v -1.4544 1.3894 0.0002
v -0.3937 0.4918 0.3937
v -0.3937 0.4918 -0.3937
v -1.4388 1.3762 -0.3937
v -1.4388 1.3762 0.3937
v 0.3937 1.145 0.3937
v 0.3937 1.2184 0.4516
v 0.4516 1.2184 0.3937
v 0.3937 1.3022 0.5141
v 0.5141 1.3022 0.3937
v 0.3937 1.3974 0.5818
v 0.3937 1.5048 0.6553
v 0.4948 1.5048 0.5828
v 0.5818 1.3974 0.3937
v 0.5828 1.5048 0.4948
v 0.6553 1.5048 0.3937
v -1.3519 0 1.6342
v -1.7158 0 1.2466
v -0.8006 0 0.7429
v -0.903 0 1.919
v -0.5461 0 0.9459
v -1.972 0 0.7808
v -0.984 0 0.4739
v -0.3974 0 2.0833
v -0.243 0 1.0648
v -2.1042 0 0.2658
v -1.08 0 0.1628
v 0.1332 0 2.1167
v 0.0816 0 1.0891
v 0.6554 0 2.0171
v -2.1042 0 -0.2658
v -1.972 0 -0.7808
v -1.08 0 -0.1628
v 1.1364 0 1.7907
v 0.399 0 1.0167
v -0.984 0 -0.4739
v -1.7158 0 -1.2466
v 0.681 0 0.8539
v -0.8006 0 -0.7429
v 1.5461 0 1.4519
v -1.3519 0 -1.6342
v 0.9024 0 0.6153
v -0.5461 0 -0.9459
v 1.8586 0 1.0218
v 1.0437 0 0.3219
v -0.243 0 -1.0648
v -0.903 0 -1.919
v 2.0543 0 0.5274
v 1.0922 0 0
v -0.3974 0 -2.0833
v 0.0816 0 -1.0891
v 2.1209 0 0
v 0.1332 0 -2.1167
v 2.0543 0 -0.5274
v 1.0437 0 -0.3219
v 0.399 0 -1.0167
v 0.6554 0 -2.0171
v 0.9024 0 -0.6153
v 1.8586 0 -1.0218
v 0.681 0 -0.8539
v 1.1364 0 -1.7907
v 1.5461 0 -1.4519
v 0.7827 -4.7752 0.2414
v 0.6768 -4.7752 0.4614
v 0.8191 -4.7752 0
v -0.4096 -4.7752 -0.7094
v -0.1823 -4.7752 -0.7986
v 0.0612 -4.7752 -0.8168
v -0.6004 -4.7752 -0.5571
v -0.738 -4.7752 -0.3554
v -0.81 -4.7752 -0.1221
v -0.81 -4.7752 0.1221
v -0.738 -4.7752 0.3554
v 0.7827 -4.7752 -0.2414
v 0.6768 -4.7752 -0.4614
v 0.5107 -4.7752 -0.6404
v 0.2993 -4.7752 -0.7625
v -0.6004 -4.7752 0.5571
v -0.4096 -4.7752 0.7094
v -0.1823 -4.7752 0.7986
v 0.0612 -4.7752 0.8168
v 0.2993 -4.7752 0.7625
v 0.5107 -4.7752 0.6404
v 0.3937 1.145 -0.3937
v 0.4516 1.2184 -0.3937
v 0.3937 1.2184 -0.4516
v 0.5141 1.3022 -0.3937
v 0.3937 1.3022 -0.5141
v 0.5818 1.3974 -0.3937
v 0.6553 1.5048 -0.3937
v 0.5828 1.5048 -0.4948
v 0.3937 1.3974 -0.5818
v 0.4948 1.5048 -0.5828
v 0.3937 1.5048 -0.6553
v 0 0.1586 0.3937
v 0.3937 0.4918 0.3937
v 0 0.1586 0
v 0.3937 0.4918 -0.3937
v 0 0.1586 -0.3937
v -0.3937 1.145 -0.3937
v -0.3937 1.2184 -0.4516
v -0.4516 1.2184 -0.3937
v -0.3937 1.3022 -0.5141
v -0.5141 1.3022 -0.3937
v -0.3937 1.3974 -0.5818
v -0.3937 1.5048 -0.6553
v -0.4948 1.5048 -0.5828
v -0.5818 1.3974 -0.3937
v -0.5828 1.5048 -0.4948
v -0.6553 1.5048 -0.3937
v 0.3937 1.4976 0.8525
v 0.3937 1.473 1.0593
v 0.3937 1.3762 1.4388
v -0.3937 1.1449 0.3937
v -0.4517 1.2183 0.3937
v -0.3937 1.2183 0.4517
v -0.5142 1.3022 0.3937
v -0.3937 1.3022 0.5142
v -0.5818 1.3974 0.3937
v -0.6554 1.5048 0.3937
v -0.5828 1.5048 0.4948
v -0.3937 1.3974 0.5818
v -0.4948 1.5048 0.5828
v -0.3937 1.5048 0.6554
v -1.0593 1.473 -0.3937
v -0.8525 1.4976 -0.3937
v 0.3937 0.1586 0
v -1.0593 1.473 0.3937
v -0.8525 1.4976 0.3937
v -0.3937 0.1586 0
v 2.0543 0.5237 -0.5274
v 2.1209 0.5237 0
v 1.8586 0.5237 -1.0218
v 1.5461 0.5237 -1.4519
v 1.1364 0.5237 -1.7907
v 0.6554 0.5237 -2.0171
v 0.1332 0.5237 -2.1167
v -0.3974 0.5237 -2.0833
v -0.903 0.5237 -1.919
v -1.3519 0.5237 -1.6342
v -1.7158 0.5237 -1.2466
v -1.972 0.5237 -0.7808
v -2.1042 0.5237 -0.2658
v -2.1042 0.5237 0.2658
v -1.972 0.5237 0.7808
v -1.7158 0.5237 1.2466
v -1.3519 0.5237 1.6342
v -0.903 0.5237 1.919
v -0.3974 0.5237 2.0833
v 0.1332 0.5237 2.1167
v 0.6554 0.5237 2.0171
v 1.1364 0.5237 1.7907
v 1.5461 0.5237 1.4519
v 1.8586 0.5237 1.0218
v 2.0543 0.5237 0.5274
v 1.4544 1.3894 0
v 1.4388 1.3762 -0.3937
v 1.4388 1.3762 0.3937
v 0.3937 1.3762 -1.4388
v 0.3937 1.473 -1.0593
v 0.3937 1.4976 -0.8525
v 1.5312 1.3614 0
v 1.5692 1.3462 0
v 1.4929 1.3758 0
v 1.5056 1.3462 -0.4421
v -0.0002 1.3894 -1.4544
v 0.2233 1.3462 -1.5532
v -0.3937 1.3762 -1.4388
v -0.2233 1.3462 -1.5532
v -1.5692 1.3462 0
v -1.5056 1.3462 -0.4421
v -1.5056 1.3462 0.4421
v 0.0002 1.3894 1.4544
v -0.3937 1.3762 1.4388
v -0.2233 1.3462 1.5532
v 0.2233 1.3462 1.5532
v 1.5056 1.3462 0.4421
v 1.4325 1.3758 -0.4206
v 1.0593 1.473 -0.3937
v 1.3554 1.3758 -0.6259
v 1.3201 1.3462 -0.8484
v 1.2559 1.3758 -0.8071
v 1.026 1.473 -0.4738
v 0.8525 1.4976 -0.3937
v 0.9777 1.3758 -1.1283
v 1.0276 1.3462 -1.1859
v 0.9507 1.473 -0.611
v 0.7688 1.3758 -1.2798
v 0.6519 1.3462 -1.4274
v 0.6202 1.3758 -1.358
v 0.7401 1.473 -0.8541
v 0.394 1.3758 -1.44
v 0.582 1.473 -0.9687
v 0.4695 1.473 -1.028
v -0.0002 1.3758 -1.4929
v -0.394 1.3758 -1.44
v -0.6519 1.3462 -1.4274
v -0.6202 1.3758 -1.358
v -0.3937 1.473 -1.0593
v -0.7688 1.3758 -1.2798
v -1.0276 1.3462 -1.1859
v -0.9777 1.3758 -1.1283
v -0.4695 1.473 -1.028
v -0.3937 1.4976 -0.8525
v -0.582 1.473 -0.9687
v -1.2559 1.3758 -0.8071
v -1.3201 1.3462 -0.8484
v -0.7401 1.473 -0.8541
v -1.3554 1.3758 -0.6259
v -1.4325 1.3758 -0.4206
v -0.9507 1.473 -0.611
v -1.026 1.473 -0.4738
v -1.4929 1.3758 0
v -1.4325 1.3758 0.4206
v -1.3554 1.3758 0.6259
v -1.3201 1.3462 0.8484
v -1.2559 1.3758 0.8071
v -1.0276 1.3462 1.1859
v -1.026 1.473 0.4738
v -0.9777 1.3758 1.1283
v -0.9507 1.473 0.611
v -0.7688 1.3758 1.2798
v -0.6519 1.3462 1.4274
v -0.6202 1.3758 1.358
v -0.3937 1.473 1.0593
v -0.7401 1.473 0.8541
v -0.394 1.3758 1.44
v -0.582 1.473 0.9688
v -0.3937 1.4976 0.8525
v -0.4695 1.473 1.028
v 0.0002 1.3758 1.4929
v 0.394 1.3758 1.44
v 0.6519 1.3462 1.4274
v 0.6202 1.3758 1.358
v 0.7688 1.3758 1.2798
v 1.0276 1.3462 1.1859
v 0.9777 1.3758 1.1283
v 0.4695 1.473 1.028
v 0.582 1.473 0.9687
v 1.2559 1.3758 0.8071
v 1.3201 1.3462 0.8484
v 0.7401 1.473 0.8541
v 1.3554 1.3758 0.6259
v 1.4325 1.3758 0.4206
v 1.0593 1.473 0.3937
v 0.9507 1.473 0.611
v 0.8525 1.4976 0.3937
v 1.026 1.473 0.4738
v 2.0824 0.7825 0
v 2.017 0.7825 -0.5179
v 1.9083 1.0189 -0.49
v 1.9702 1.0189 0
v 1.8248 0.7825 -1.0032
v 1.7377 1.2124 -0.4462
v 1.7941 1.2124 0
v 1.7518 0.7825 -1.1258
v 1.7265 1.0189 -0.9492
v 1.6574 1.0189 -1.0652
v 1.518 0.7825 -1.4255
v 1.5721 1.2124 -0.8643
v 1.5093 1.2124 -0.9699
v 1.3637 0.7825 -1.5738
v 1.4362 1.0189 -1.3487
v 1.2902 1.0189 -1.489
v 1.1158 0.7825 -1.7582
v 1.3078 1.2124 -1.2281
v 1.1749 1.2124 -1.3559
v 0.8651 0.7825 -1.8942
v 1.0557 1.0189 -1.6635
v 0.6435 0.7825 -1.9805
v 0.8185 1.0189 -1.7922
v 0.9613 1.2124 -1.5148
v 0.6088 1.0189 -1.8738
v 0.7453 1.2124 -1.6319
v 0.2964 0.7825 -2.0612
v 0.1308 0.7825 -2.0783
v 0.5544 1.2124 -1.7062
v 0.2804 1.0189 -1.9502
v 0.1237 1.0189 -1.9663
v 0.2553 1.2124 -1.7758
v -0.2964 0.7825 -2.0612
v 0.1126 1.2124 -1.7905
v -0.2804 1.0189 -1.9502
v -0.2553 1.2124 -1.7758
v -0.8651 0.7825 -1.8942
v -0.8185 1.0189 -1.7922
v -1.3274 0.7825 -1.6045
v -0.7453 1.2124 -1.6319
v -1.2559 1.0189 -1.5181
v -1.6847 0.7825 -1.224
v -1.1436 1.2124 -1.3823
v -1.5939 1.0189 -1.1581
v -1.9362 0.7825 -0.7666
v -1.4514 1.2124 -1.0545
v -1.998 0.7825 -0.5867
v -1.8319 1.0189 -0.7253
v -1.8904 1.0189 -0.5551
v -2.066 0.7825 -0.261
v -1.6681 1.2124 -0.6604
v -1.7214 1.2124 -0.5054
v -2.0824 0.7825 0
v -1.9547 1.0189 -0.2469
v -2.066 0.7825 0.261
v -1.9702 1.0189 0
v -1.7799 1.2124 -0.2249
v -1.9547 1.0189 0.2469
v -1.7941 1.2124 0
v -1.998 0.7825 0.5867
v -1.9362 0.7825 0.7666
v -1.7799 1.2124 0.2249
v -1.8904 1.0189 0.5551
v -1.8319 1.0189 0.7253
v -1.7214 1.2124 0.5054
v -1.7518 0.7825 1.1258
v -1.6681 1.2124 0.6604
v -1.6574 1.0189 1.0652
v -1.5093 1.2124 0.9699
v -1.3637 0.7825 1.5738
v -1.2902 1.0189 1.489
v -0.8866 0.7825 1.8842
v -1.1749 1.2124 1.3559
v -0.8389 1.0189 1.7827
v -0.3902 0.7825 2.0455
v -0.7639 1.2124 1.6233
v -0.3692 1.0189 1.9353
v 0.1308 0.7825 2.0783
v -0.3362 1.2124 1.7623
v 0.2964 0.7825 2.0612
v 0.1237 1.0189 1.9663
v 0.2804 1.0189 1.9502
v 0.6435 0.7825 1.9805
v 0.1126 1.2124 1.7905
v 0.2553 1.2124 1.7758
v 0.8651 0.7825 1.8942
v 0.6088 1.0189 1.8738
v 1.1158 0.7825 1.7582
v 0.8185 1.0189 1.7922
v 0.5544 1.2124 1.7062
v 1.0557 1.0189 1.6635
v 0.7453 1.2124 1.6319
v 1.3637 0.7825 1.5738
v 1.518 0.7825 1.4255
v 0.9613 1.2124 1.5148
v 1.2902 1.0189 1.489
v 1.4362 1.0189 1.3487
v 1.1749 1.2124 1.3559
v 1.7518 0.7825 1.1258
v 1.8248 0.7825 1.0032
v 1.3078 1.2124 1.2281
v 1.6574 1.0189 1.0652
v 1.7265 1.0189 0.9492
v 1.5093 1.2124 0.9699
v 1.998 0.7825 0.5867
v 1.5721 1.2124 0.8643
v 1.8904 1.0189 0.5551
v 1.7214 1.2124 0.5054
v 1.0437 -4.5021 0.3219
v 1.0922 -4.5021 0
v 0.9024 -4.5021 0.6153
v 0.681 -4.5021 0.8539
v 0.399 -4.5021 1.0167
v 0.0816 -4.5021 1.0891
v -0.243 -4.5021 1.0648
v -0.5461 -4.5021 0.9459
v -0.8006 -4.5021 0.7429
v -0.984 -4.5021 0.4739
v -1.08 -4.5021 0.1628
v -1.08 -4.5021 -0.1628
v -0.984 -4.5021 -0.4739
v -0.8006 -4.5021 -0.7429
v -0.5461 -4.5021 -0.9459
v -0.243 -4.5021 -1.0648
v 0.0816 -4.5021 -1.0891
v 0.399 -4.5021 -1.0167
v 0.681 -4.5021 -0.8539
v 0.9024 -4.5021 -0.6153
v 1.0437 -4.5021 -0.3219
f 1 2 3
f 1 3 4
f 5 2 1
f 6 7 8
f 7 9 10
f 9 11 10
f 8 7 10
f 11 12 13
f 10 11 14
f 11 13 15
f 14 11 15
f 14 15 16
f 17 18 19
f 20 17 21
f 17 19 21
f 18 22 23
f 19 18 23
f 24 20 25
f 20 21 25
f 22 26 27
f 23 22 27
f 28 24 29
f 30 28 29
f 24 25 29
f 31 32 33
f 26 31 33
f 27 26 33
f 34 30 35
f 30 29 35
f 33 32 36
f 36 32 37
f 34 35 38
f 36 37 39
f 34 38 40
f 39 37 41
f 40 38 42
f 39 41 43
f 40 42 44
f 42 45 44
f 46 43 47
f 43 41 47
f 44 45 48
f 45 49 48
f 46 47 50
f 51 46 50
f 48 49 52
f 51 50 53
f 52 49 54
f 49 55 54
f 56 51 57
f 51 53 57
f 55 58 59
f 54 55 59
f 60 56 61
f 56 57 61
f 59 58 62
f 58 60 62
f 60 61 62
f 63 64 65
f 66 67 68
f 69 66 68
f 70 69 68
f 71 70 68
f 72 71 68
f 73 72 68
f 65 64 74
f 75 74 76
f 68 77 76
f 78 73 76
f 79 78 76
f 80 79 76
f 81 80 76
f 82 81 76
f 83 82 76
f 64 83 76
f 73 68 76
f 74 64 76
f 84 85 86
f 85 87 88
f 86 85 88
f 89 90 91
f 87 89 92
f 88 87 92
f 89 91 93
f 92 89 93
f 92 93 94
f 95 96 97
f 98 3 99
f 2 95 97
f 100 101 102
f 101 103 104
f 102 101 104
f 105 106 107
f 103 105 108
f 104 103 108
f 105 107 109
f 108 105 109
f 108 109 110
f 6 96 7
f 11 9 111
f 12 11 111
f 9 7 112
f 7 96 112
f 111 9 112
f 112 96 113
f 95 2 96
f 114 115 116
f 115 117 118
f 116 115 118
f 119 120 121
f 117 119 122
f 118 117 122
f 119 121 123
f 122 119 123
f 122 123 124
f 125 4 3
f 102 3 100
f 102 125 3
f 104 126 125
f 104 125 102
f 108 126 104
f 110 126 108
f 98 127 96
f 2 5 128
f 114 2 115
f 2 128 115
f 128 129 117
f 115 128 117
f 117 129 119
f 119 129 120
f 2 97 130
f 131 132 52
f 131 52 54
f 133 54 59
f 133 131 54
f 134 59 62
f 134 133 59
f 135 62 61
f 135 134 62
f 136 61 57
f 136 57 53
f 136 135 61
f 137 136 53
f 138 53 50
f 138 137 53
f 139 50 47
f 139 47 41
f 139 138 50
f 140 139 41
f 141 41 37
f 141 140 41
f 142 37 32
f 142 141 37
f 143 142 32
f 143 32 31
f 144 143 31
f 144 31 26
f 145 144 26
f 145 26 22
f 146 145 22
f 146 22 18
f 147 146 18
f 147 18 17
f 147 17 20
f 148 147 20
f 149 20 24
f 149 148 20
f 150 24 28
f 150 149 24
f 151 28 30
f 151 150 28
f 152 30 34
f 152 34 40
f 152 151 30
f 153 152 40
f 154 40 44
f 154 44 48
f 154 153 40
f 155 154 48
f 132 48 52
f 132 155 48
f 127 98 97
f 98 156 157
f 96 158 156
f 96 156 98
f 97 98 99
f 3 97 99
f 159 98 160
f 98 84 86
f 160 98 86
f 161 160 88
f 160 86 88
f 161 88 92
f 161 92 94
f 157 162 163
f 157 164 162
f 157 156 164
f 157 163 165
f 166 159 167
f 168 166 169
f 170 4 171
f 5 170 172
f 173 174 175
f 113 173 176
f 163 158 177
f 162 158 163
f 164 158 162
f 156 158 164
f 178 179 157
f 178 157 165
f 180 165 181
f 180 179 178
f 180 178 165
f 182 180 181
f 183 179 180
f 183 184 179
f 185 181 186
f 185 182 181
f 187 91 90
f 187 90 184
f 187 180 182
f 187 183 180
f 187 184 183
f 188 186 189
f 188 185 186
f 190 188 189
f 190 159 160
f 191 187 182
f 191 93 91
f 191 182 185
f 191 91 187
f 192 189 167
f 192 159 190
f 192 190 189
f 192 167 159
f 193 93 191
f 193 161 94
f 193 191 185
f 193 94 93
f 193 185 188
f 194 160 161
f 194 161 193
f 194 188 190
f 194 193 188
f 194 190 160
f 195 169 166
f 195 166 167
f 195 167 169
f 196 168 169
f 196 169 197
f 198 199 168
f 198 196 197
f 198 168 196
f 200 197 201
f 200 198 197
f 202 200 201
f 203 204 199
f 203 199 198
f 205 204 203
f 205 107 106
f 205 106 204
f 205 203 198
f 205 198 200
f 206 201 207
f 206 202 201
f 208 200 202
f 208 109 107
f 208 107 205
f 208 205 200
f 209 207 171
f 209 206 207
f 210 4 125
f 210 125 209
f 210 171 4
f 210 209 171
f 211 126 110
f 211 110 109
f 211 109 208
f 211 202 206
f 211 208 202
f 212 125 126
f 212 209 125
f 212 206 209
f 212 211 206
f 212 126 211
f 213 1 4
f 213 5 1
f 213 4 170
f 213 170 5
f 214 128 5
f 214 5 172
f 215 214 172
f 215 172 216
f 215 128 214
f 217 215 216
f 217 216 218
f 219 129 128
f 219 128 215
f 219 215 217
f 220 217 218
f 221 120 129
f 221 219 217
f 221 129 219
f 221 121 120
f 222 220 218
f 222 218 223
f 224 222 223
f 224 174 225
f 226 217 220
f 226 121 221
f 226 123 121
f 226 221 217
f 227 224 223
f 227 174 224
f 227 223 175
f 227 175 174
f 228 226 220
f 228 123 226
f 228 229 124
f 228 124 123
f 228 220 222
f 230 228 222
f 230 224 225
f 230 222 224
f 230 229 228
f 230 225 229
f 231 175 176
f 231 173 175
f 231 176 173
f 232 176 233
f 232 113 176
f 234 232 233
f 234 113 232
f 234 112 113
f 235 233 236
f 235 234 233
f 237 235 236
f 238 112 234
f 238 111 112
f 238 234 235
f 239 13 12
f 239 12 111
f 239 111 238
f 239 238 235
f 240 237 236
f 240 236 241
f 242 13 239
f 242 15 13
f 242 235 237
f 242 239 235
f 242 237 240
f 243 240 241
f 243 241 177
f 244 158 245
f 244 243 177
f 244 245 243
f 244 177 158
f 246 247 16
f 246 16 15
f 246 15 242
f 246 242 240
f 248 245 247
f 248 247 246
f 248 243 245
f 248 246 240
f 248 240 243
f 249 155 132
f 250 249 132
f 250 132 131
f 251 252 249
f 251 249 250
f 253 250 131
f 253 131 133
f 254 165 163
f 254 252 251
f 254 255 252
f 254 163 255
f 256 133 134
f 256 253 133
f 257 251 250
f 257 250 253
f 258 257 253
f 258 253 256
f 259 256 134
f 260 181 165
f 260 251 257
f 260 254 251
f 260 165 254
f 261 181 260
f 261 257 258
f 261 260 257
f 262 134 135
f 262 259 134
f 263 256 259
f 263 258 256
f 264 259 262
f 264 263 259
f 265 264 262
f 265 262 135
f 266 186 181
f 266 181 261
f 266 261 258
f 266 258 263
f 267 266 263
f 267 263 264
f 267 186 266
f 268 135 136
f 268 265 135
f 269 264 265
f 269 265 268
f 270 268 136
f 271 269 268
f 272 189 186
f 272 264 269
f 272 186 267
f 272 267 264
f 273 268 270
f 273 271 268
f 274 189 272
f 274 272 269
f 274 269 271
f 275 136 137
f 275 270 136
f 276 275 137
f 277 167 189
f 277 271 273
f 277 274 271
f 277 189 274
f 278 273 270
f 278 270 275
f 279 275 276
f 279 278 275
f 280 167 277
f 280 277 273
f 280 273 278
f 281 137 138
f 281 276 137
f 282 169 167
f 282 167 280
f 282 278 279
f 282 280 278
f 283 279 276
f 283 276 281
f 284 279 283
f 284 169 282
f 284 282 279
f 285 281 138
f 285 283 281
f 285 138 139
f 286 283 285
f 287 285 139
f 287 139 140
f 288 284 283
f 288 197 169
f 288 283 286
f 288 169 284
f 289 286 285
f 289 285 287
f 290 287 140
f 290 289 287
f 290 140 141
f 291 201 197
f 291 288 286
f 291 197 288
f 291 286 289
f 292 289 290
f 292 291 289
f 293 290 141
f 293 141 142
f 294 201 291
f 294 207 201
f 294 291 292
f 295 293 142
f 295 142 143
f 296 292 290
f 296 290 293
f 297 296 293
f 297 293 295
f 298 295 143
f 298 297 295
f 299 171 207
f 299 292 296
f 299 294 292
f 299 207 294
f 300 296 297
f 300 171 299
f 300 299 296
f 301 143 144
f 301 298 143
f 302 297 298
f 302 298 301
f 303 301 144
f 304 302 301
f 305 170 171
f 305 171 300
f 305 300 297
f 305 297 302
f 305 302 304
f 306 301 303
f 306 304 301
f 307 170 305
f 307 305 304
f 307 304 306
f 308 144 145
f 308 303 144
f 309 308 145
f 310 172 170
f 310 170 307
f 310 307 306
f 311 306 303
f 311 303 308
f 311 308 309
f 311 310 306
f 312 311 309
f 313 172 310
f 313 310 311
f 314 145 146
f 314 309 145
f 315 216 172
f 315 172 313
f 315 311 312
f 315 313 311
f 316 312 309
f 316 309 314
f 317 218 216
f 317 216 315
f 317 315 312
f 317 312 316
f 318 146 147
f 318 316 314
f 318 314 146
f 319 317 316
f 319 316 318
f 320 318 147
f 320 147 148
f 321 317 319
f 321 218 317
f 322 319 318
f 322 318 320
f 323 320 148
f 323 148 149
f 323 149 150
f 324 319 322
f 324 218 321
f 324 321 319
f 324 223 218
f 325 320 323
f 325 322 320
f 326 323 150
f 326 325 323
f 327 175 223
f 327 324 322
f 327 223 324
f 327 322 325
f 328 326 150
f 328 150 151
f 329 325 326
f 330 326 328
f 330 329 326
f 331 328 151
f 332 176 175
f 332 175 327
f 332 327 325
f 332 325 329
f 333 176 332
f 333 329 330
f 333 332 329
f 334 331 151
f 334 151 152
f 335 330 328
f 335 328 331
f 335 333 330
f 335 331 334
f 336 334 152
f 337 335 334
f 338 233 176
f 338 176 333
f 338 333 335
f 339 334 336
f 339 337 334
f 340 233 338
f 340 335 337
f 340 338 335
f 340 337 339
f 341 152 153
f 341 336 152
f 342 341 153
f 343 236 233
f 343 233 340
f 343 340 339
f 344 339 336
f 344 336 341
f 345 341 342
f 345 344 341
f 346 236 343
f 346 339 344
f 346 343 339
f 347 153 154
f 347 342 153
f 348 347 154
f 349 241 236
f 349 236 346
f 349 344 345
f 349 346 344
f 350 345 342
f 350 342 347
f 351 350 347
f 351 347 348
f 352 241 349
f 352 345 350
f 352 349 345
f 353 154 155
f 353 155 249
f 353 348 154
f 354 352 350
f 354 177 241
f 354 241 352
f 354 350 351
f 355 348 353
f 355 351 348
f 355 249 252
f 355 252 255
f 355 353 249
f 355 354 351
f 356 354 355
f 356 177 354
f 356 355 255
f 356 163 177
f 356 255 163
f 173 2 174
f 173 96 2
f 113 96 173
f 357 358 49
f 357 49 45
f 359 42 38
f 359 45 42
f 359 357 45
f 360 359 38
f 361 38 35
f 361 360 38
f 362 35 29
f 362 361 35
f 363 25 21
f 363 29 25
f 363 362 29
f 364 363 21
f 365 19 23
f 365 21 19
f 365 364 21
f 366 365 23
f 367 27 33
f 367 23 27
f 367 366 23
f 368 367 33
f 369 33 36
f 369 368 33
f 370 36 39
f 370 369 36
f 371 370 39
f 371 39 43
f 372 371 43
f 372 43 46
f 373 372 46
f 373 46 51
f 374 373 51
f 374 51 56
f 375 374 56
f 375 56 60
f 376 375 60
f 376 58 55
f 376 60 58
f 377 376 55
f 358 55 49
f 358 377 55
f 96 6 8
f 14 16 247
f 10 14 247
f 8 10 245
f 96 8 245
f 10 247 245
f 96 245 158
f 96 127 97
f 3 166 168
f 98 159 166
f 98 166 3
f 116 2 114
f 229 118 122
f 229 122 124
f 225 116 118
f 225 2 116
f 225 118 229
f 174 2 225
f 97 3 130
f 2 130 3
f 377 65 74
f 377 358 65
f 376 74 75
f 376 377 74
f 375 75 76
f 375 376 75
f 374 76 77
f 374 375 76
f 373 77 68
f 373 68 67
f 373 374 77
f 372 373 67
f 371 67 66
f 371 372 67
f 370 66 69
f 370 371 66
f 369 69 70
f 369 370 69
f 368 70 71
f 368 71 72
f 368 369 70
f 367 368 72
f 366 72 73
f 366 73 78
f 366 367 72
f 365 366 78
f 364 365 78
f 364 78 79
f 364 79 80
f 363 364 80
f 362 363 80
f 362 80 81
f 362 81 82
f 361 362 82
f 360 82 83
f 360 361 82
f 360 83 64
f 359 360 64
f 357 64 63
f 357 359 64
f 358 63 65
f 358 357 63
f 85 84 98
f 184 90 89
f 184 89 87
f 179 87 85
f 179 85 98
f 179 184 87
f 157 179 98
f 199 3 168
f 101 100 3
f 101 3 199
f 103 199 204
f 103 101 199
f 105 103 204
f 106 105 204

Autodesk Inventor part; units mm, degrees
ref_plane "YZ Plane" through (0, 0, 0) normal (1, 0, 0) x (0, 1, 0)
ref_plane "XZ Plane" through (0, 0, 0) normal (0, 1, 0) x (-1, 0, 0)
ref_plane "XY Plane" through (0, 0, 0) normal (0, 0, 1) x (1, 0, 0)
sketch "Sketch1" plane through (0, 0, 0) normal (0, 0, 1) x (1, 0, 0)
  line L0 (0, -5.4574) -> (0, 4.0933) projected
  line L1 (2.1209, 0) -> (2.1209, 0.5237)
  arc A0 (2.1209, 0.5237) -> (1.5692, 1.3462) centre (1.2319, 0.5237) ccw
  arc A1 (1.5692, 1.3462) -> (0.7645, 1.5048) centre (0.7645, -0.6161) ccw
  line L2 (0.7645, 1.5048) -> (0, 1.5048)
  line L3 (2.1209, 0) -> (1.0922, 0)
  line L4 (1.0922, 0) -> (1.0922, -4.7752)
  line L5 (1.0922, -4.7752) -> (0, -4.7752)
  point P0 (0, 0)
  dimension "d0" = 2.1844
  dimension "d1" = 4.2418
  dimension "d2" = 0.889
  dimension "d3" = 2.1209
  dimension "d4" = 4.7752
  dimension "d6" = 1.5291
  dimension "d8" = 1.3462
revolve "Revolution1" add sketch "Sketch1" angle 360 about axis through (0, -10, 0) along (0, 1, 0)
sketch "Sketch2" plane through (0, 0, 0) normal (0, 0, 1) x (1, 0, 0)
  line L0 (0, 0.1586) -> (-1.5907, 1.5048)
  line L1 (-1.5907, 1.5048) -> (1.5907, 1.5048)
  line L2 (1.5907, 1.5048) -> (0, 0.1586)
  line L3 (0, 0.0835) -> (0, 2.5016) projected
  line L4 (-0.7645, 1.5048) -> (0.7645, 1.5048) projected
  dimension "d9" = 3.1814
  dimension "d22" = 1.3462
extrude "Extrusion1" cut sketch "Sketch2" against normal mid plane 0.7874
sketch "Sketch3" plane through (0, 0, 0) normal (1, 0, 0) x (0, 1, 0)
  line L0 (1.5048, 1.5907) -> (1.5048, -1.5907)
  line L1 (1.5048, -1.5907) -> (0.1586, 0)
  line L2 (0.1586, 0) -> (1.5048, 1.5907)
  point P0 (1.5048, 0)
  point P1 (1.5048, 0)
  point P2 (1.5048, 0)
  dimension "d12" = 3.1814
extrude "Extrusion2" cut sketch "Sketch3" against normal mid plane 0.7874
sketch "Sketch4" plane through (-0.6554, 1.5048, 0.3937) normal (0, 1, 0) x (1, 0, 0)
  arc A0 (0, 0) -> (0.2617, -0.2617) centre (0.6554, 0.3937) ccw projected
  circle A1 centre (0.6554, 0.3937) radius 0.7645
  dimension "d17" = 1.5291
extrude "Extrusion3" cut sketch "Sketch4" against normal blind 0.7645 draft -30
thread "Thread1" size "2-56 UNC" class "2A" standard "ANSI Unified Screw Threads" length 4.5466
chamfer "Chamfer1" distance 0.2731 angle 45 1 edges at (-1.0922, -4.7752, 0)
equation "\"d0\" = Dia"
equation "\"d1\" = HeadDia"
equation "\"d2\" = HeadRad"
equation "\"d3\" = 0.5 * d1"
equation "\"d4\" = ShankLength"
equation "\"d6\" = 0.7 * d0"
equation "\"d8\" = HeadHeight"
equation "\"d9\" = 0.75 * d1"
equation "\"d22\" = HeadHeight"
equation "\"d10\" = SlotW"
equation "\"d12\" = d9"
equation "\"d13\" = SlotW"
equation "\"d17\" = d6"
equation "\"d15\" = 0.5 * d6"
equation "\"d18\" = ThreadLength"
equation "\"d20\" = 0.125 * Dia"
equation "\"d21\" = 0.125 * Dia"
equation "\"Dia\" = 2.1844"
equation "\"ShankLength\" = 4.7752"
equation "\"HeadDia\" = 4.2418"
equation "\"HeadRad\" = 0.889"
equation "\"SlotW\" = 0.7874"
equation "\"SlotD\" = 0.7874"
equation "\"HeadHeight\" = 1.3462"
equation "\"ThreadLength\" = 4.5466"
properties part number "Phillips Pan Head Machine Screw Inch" material "Steel, High Strength Low Alloy"
